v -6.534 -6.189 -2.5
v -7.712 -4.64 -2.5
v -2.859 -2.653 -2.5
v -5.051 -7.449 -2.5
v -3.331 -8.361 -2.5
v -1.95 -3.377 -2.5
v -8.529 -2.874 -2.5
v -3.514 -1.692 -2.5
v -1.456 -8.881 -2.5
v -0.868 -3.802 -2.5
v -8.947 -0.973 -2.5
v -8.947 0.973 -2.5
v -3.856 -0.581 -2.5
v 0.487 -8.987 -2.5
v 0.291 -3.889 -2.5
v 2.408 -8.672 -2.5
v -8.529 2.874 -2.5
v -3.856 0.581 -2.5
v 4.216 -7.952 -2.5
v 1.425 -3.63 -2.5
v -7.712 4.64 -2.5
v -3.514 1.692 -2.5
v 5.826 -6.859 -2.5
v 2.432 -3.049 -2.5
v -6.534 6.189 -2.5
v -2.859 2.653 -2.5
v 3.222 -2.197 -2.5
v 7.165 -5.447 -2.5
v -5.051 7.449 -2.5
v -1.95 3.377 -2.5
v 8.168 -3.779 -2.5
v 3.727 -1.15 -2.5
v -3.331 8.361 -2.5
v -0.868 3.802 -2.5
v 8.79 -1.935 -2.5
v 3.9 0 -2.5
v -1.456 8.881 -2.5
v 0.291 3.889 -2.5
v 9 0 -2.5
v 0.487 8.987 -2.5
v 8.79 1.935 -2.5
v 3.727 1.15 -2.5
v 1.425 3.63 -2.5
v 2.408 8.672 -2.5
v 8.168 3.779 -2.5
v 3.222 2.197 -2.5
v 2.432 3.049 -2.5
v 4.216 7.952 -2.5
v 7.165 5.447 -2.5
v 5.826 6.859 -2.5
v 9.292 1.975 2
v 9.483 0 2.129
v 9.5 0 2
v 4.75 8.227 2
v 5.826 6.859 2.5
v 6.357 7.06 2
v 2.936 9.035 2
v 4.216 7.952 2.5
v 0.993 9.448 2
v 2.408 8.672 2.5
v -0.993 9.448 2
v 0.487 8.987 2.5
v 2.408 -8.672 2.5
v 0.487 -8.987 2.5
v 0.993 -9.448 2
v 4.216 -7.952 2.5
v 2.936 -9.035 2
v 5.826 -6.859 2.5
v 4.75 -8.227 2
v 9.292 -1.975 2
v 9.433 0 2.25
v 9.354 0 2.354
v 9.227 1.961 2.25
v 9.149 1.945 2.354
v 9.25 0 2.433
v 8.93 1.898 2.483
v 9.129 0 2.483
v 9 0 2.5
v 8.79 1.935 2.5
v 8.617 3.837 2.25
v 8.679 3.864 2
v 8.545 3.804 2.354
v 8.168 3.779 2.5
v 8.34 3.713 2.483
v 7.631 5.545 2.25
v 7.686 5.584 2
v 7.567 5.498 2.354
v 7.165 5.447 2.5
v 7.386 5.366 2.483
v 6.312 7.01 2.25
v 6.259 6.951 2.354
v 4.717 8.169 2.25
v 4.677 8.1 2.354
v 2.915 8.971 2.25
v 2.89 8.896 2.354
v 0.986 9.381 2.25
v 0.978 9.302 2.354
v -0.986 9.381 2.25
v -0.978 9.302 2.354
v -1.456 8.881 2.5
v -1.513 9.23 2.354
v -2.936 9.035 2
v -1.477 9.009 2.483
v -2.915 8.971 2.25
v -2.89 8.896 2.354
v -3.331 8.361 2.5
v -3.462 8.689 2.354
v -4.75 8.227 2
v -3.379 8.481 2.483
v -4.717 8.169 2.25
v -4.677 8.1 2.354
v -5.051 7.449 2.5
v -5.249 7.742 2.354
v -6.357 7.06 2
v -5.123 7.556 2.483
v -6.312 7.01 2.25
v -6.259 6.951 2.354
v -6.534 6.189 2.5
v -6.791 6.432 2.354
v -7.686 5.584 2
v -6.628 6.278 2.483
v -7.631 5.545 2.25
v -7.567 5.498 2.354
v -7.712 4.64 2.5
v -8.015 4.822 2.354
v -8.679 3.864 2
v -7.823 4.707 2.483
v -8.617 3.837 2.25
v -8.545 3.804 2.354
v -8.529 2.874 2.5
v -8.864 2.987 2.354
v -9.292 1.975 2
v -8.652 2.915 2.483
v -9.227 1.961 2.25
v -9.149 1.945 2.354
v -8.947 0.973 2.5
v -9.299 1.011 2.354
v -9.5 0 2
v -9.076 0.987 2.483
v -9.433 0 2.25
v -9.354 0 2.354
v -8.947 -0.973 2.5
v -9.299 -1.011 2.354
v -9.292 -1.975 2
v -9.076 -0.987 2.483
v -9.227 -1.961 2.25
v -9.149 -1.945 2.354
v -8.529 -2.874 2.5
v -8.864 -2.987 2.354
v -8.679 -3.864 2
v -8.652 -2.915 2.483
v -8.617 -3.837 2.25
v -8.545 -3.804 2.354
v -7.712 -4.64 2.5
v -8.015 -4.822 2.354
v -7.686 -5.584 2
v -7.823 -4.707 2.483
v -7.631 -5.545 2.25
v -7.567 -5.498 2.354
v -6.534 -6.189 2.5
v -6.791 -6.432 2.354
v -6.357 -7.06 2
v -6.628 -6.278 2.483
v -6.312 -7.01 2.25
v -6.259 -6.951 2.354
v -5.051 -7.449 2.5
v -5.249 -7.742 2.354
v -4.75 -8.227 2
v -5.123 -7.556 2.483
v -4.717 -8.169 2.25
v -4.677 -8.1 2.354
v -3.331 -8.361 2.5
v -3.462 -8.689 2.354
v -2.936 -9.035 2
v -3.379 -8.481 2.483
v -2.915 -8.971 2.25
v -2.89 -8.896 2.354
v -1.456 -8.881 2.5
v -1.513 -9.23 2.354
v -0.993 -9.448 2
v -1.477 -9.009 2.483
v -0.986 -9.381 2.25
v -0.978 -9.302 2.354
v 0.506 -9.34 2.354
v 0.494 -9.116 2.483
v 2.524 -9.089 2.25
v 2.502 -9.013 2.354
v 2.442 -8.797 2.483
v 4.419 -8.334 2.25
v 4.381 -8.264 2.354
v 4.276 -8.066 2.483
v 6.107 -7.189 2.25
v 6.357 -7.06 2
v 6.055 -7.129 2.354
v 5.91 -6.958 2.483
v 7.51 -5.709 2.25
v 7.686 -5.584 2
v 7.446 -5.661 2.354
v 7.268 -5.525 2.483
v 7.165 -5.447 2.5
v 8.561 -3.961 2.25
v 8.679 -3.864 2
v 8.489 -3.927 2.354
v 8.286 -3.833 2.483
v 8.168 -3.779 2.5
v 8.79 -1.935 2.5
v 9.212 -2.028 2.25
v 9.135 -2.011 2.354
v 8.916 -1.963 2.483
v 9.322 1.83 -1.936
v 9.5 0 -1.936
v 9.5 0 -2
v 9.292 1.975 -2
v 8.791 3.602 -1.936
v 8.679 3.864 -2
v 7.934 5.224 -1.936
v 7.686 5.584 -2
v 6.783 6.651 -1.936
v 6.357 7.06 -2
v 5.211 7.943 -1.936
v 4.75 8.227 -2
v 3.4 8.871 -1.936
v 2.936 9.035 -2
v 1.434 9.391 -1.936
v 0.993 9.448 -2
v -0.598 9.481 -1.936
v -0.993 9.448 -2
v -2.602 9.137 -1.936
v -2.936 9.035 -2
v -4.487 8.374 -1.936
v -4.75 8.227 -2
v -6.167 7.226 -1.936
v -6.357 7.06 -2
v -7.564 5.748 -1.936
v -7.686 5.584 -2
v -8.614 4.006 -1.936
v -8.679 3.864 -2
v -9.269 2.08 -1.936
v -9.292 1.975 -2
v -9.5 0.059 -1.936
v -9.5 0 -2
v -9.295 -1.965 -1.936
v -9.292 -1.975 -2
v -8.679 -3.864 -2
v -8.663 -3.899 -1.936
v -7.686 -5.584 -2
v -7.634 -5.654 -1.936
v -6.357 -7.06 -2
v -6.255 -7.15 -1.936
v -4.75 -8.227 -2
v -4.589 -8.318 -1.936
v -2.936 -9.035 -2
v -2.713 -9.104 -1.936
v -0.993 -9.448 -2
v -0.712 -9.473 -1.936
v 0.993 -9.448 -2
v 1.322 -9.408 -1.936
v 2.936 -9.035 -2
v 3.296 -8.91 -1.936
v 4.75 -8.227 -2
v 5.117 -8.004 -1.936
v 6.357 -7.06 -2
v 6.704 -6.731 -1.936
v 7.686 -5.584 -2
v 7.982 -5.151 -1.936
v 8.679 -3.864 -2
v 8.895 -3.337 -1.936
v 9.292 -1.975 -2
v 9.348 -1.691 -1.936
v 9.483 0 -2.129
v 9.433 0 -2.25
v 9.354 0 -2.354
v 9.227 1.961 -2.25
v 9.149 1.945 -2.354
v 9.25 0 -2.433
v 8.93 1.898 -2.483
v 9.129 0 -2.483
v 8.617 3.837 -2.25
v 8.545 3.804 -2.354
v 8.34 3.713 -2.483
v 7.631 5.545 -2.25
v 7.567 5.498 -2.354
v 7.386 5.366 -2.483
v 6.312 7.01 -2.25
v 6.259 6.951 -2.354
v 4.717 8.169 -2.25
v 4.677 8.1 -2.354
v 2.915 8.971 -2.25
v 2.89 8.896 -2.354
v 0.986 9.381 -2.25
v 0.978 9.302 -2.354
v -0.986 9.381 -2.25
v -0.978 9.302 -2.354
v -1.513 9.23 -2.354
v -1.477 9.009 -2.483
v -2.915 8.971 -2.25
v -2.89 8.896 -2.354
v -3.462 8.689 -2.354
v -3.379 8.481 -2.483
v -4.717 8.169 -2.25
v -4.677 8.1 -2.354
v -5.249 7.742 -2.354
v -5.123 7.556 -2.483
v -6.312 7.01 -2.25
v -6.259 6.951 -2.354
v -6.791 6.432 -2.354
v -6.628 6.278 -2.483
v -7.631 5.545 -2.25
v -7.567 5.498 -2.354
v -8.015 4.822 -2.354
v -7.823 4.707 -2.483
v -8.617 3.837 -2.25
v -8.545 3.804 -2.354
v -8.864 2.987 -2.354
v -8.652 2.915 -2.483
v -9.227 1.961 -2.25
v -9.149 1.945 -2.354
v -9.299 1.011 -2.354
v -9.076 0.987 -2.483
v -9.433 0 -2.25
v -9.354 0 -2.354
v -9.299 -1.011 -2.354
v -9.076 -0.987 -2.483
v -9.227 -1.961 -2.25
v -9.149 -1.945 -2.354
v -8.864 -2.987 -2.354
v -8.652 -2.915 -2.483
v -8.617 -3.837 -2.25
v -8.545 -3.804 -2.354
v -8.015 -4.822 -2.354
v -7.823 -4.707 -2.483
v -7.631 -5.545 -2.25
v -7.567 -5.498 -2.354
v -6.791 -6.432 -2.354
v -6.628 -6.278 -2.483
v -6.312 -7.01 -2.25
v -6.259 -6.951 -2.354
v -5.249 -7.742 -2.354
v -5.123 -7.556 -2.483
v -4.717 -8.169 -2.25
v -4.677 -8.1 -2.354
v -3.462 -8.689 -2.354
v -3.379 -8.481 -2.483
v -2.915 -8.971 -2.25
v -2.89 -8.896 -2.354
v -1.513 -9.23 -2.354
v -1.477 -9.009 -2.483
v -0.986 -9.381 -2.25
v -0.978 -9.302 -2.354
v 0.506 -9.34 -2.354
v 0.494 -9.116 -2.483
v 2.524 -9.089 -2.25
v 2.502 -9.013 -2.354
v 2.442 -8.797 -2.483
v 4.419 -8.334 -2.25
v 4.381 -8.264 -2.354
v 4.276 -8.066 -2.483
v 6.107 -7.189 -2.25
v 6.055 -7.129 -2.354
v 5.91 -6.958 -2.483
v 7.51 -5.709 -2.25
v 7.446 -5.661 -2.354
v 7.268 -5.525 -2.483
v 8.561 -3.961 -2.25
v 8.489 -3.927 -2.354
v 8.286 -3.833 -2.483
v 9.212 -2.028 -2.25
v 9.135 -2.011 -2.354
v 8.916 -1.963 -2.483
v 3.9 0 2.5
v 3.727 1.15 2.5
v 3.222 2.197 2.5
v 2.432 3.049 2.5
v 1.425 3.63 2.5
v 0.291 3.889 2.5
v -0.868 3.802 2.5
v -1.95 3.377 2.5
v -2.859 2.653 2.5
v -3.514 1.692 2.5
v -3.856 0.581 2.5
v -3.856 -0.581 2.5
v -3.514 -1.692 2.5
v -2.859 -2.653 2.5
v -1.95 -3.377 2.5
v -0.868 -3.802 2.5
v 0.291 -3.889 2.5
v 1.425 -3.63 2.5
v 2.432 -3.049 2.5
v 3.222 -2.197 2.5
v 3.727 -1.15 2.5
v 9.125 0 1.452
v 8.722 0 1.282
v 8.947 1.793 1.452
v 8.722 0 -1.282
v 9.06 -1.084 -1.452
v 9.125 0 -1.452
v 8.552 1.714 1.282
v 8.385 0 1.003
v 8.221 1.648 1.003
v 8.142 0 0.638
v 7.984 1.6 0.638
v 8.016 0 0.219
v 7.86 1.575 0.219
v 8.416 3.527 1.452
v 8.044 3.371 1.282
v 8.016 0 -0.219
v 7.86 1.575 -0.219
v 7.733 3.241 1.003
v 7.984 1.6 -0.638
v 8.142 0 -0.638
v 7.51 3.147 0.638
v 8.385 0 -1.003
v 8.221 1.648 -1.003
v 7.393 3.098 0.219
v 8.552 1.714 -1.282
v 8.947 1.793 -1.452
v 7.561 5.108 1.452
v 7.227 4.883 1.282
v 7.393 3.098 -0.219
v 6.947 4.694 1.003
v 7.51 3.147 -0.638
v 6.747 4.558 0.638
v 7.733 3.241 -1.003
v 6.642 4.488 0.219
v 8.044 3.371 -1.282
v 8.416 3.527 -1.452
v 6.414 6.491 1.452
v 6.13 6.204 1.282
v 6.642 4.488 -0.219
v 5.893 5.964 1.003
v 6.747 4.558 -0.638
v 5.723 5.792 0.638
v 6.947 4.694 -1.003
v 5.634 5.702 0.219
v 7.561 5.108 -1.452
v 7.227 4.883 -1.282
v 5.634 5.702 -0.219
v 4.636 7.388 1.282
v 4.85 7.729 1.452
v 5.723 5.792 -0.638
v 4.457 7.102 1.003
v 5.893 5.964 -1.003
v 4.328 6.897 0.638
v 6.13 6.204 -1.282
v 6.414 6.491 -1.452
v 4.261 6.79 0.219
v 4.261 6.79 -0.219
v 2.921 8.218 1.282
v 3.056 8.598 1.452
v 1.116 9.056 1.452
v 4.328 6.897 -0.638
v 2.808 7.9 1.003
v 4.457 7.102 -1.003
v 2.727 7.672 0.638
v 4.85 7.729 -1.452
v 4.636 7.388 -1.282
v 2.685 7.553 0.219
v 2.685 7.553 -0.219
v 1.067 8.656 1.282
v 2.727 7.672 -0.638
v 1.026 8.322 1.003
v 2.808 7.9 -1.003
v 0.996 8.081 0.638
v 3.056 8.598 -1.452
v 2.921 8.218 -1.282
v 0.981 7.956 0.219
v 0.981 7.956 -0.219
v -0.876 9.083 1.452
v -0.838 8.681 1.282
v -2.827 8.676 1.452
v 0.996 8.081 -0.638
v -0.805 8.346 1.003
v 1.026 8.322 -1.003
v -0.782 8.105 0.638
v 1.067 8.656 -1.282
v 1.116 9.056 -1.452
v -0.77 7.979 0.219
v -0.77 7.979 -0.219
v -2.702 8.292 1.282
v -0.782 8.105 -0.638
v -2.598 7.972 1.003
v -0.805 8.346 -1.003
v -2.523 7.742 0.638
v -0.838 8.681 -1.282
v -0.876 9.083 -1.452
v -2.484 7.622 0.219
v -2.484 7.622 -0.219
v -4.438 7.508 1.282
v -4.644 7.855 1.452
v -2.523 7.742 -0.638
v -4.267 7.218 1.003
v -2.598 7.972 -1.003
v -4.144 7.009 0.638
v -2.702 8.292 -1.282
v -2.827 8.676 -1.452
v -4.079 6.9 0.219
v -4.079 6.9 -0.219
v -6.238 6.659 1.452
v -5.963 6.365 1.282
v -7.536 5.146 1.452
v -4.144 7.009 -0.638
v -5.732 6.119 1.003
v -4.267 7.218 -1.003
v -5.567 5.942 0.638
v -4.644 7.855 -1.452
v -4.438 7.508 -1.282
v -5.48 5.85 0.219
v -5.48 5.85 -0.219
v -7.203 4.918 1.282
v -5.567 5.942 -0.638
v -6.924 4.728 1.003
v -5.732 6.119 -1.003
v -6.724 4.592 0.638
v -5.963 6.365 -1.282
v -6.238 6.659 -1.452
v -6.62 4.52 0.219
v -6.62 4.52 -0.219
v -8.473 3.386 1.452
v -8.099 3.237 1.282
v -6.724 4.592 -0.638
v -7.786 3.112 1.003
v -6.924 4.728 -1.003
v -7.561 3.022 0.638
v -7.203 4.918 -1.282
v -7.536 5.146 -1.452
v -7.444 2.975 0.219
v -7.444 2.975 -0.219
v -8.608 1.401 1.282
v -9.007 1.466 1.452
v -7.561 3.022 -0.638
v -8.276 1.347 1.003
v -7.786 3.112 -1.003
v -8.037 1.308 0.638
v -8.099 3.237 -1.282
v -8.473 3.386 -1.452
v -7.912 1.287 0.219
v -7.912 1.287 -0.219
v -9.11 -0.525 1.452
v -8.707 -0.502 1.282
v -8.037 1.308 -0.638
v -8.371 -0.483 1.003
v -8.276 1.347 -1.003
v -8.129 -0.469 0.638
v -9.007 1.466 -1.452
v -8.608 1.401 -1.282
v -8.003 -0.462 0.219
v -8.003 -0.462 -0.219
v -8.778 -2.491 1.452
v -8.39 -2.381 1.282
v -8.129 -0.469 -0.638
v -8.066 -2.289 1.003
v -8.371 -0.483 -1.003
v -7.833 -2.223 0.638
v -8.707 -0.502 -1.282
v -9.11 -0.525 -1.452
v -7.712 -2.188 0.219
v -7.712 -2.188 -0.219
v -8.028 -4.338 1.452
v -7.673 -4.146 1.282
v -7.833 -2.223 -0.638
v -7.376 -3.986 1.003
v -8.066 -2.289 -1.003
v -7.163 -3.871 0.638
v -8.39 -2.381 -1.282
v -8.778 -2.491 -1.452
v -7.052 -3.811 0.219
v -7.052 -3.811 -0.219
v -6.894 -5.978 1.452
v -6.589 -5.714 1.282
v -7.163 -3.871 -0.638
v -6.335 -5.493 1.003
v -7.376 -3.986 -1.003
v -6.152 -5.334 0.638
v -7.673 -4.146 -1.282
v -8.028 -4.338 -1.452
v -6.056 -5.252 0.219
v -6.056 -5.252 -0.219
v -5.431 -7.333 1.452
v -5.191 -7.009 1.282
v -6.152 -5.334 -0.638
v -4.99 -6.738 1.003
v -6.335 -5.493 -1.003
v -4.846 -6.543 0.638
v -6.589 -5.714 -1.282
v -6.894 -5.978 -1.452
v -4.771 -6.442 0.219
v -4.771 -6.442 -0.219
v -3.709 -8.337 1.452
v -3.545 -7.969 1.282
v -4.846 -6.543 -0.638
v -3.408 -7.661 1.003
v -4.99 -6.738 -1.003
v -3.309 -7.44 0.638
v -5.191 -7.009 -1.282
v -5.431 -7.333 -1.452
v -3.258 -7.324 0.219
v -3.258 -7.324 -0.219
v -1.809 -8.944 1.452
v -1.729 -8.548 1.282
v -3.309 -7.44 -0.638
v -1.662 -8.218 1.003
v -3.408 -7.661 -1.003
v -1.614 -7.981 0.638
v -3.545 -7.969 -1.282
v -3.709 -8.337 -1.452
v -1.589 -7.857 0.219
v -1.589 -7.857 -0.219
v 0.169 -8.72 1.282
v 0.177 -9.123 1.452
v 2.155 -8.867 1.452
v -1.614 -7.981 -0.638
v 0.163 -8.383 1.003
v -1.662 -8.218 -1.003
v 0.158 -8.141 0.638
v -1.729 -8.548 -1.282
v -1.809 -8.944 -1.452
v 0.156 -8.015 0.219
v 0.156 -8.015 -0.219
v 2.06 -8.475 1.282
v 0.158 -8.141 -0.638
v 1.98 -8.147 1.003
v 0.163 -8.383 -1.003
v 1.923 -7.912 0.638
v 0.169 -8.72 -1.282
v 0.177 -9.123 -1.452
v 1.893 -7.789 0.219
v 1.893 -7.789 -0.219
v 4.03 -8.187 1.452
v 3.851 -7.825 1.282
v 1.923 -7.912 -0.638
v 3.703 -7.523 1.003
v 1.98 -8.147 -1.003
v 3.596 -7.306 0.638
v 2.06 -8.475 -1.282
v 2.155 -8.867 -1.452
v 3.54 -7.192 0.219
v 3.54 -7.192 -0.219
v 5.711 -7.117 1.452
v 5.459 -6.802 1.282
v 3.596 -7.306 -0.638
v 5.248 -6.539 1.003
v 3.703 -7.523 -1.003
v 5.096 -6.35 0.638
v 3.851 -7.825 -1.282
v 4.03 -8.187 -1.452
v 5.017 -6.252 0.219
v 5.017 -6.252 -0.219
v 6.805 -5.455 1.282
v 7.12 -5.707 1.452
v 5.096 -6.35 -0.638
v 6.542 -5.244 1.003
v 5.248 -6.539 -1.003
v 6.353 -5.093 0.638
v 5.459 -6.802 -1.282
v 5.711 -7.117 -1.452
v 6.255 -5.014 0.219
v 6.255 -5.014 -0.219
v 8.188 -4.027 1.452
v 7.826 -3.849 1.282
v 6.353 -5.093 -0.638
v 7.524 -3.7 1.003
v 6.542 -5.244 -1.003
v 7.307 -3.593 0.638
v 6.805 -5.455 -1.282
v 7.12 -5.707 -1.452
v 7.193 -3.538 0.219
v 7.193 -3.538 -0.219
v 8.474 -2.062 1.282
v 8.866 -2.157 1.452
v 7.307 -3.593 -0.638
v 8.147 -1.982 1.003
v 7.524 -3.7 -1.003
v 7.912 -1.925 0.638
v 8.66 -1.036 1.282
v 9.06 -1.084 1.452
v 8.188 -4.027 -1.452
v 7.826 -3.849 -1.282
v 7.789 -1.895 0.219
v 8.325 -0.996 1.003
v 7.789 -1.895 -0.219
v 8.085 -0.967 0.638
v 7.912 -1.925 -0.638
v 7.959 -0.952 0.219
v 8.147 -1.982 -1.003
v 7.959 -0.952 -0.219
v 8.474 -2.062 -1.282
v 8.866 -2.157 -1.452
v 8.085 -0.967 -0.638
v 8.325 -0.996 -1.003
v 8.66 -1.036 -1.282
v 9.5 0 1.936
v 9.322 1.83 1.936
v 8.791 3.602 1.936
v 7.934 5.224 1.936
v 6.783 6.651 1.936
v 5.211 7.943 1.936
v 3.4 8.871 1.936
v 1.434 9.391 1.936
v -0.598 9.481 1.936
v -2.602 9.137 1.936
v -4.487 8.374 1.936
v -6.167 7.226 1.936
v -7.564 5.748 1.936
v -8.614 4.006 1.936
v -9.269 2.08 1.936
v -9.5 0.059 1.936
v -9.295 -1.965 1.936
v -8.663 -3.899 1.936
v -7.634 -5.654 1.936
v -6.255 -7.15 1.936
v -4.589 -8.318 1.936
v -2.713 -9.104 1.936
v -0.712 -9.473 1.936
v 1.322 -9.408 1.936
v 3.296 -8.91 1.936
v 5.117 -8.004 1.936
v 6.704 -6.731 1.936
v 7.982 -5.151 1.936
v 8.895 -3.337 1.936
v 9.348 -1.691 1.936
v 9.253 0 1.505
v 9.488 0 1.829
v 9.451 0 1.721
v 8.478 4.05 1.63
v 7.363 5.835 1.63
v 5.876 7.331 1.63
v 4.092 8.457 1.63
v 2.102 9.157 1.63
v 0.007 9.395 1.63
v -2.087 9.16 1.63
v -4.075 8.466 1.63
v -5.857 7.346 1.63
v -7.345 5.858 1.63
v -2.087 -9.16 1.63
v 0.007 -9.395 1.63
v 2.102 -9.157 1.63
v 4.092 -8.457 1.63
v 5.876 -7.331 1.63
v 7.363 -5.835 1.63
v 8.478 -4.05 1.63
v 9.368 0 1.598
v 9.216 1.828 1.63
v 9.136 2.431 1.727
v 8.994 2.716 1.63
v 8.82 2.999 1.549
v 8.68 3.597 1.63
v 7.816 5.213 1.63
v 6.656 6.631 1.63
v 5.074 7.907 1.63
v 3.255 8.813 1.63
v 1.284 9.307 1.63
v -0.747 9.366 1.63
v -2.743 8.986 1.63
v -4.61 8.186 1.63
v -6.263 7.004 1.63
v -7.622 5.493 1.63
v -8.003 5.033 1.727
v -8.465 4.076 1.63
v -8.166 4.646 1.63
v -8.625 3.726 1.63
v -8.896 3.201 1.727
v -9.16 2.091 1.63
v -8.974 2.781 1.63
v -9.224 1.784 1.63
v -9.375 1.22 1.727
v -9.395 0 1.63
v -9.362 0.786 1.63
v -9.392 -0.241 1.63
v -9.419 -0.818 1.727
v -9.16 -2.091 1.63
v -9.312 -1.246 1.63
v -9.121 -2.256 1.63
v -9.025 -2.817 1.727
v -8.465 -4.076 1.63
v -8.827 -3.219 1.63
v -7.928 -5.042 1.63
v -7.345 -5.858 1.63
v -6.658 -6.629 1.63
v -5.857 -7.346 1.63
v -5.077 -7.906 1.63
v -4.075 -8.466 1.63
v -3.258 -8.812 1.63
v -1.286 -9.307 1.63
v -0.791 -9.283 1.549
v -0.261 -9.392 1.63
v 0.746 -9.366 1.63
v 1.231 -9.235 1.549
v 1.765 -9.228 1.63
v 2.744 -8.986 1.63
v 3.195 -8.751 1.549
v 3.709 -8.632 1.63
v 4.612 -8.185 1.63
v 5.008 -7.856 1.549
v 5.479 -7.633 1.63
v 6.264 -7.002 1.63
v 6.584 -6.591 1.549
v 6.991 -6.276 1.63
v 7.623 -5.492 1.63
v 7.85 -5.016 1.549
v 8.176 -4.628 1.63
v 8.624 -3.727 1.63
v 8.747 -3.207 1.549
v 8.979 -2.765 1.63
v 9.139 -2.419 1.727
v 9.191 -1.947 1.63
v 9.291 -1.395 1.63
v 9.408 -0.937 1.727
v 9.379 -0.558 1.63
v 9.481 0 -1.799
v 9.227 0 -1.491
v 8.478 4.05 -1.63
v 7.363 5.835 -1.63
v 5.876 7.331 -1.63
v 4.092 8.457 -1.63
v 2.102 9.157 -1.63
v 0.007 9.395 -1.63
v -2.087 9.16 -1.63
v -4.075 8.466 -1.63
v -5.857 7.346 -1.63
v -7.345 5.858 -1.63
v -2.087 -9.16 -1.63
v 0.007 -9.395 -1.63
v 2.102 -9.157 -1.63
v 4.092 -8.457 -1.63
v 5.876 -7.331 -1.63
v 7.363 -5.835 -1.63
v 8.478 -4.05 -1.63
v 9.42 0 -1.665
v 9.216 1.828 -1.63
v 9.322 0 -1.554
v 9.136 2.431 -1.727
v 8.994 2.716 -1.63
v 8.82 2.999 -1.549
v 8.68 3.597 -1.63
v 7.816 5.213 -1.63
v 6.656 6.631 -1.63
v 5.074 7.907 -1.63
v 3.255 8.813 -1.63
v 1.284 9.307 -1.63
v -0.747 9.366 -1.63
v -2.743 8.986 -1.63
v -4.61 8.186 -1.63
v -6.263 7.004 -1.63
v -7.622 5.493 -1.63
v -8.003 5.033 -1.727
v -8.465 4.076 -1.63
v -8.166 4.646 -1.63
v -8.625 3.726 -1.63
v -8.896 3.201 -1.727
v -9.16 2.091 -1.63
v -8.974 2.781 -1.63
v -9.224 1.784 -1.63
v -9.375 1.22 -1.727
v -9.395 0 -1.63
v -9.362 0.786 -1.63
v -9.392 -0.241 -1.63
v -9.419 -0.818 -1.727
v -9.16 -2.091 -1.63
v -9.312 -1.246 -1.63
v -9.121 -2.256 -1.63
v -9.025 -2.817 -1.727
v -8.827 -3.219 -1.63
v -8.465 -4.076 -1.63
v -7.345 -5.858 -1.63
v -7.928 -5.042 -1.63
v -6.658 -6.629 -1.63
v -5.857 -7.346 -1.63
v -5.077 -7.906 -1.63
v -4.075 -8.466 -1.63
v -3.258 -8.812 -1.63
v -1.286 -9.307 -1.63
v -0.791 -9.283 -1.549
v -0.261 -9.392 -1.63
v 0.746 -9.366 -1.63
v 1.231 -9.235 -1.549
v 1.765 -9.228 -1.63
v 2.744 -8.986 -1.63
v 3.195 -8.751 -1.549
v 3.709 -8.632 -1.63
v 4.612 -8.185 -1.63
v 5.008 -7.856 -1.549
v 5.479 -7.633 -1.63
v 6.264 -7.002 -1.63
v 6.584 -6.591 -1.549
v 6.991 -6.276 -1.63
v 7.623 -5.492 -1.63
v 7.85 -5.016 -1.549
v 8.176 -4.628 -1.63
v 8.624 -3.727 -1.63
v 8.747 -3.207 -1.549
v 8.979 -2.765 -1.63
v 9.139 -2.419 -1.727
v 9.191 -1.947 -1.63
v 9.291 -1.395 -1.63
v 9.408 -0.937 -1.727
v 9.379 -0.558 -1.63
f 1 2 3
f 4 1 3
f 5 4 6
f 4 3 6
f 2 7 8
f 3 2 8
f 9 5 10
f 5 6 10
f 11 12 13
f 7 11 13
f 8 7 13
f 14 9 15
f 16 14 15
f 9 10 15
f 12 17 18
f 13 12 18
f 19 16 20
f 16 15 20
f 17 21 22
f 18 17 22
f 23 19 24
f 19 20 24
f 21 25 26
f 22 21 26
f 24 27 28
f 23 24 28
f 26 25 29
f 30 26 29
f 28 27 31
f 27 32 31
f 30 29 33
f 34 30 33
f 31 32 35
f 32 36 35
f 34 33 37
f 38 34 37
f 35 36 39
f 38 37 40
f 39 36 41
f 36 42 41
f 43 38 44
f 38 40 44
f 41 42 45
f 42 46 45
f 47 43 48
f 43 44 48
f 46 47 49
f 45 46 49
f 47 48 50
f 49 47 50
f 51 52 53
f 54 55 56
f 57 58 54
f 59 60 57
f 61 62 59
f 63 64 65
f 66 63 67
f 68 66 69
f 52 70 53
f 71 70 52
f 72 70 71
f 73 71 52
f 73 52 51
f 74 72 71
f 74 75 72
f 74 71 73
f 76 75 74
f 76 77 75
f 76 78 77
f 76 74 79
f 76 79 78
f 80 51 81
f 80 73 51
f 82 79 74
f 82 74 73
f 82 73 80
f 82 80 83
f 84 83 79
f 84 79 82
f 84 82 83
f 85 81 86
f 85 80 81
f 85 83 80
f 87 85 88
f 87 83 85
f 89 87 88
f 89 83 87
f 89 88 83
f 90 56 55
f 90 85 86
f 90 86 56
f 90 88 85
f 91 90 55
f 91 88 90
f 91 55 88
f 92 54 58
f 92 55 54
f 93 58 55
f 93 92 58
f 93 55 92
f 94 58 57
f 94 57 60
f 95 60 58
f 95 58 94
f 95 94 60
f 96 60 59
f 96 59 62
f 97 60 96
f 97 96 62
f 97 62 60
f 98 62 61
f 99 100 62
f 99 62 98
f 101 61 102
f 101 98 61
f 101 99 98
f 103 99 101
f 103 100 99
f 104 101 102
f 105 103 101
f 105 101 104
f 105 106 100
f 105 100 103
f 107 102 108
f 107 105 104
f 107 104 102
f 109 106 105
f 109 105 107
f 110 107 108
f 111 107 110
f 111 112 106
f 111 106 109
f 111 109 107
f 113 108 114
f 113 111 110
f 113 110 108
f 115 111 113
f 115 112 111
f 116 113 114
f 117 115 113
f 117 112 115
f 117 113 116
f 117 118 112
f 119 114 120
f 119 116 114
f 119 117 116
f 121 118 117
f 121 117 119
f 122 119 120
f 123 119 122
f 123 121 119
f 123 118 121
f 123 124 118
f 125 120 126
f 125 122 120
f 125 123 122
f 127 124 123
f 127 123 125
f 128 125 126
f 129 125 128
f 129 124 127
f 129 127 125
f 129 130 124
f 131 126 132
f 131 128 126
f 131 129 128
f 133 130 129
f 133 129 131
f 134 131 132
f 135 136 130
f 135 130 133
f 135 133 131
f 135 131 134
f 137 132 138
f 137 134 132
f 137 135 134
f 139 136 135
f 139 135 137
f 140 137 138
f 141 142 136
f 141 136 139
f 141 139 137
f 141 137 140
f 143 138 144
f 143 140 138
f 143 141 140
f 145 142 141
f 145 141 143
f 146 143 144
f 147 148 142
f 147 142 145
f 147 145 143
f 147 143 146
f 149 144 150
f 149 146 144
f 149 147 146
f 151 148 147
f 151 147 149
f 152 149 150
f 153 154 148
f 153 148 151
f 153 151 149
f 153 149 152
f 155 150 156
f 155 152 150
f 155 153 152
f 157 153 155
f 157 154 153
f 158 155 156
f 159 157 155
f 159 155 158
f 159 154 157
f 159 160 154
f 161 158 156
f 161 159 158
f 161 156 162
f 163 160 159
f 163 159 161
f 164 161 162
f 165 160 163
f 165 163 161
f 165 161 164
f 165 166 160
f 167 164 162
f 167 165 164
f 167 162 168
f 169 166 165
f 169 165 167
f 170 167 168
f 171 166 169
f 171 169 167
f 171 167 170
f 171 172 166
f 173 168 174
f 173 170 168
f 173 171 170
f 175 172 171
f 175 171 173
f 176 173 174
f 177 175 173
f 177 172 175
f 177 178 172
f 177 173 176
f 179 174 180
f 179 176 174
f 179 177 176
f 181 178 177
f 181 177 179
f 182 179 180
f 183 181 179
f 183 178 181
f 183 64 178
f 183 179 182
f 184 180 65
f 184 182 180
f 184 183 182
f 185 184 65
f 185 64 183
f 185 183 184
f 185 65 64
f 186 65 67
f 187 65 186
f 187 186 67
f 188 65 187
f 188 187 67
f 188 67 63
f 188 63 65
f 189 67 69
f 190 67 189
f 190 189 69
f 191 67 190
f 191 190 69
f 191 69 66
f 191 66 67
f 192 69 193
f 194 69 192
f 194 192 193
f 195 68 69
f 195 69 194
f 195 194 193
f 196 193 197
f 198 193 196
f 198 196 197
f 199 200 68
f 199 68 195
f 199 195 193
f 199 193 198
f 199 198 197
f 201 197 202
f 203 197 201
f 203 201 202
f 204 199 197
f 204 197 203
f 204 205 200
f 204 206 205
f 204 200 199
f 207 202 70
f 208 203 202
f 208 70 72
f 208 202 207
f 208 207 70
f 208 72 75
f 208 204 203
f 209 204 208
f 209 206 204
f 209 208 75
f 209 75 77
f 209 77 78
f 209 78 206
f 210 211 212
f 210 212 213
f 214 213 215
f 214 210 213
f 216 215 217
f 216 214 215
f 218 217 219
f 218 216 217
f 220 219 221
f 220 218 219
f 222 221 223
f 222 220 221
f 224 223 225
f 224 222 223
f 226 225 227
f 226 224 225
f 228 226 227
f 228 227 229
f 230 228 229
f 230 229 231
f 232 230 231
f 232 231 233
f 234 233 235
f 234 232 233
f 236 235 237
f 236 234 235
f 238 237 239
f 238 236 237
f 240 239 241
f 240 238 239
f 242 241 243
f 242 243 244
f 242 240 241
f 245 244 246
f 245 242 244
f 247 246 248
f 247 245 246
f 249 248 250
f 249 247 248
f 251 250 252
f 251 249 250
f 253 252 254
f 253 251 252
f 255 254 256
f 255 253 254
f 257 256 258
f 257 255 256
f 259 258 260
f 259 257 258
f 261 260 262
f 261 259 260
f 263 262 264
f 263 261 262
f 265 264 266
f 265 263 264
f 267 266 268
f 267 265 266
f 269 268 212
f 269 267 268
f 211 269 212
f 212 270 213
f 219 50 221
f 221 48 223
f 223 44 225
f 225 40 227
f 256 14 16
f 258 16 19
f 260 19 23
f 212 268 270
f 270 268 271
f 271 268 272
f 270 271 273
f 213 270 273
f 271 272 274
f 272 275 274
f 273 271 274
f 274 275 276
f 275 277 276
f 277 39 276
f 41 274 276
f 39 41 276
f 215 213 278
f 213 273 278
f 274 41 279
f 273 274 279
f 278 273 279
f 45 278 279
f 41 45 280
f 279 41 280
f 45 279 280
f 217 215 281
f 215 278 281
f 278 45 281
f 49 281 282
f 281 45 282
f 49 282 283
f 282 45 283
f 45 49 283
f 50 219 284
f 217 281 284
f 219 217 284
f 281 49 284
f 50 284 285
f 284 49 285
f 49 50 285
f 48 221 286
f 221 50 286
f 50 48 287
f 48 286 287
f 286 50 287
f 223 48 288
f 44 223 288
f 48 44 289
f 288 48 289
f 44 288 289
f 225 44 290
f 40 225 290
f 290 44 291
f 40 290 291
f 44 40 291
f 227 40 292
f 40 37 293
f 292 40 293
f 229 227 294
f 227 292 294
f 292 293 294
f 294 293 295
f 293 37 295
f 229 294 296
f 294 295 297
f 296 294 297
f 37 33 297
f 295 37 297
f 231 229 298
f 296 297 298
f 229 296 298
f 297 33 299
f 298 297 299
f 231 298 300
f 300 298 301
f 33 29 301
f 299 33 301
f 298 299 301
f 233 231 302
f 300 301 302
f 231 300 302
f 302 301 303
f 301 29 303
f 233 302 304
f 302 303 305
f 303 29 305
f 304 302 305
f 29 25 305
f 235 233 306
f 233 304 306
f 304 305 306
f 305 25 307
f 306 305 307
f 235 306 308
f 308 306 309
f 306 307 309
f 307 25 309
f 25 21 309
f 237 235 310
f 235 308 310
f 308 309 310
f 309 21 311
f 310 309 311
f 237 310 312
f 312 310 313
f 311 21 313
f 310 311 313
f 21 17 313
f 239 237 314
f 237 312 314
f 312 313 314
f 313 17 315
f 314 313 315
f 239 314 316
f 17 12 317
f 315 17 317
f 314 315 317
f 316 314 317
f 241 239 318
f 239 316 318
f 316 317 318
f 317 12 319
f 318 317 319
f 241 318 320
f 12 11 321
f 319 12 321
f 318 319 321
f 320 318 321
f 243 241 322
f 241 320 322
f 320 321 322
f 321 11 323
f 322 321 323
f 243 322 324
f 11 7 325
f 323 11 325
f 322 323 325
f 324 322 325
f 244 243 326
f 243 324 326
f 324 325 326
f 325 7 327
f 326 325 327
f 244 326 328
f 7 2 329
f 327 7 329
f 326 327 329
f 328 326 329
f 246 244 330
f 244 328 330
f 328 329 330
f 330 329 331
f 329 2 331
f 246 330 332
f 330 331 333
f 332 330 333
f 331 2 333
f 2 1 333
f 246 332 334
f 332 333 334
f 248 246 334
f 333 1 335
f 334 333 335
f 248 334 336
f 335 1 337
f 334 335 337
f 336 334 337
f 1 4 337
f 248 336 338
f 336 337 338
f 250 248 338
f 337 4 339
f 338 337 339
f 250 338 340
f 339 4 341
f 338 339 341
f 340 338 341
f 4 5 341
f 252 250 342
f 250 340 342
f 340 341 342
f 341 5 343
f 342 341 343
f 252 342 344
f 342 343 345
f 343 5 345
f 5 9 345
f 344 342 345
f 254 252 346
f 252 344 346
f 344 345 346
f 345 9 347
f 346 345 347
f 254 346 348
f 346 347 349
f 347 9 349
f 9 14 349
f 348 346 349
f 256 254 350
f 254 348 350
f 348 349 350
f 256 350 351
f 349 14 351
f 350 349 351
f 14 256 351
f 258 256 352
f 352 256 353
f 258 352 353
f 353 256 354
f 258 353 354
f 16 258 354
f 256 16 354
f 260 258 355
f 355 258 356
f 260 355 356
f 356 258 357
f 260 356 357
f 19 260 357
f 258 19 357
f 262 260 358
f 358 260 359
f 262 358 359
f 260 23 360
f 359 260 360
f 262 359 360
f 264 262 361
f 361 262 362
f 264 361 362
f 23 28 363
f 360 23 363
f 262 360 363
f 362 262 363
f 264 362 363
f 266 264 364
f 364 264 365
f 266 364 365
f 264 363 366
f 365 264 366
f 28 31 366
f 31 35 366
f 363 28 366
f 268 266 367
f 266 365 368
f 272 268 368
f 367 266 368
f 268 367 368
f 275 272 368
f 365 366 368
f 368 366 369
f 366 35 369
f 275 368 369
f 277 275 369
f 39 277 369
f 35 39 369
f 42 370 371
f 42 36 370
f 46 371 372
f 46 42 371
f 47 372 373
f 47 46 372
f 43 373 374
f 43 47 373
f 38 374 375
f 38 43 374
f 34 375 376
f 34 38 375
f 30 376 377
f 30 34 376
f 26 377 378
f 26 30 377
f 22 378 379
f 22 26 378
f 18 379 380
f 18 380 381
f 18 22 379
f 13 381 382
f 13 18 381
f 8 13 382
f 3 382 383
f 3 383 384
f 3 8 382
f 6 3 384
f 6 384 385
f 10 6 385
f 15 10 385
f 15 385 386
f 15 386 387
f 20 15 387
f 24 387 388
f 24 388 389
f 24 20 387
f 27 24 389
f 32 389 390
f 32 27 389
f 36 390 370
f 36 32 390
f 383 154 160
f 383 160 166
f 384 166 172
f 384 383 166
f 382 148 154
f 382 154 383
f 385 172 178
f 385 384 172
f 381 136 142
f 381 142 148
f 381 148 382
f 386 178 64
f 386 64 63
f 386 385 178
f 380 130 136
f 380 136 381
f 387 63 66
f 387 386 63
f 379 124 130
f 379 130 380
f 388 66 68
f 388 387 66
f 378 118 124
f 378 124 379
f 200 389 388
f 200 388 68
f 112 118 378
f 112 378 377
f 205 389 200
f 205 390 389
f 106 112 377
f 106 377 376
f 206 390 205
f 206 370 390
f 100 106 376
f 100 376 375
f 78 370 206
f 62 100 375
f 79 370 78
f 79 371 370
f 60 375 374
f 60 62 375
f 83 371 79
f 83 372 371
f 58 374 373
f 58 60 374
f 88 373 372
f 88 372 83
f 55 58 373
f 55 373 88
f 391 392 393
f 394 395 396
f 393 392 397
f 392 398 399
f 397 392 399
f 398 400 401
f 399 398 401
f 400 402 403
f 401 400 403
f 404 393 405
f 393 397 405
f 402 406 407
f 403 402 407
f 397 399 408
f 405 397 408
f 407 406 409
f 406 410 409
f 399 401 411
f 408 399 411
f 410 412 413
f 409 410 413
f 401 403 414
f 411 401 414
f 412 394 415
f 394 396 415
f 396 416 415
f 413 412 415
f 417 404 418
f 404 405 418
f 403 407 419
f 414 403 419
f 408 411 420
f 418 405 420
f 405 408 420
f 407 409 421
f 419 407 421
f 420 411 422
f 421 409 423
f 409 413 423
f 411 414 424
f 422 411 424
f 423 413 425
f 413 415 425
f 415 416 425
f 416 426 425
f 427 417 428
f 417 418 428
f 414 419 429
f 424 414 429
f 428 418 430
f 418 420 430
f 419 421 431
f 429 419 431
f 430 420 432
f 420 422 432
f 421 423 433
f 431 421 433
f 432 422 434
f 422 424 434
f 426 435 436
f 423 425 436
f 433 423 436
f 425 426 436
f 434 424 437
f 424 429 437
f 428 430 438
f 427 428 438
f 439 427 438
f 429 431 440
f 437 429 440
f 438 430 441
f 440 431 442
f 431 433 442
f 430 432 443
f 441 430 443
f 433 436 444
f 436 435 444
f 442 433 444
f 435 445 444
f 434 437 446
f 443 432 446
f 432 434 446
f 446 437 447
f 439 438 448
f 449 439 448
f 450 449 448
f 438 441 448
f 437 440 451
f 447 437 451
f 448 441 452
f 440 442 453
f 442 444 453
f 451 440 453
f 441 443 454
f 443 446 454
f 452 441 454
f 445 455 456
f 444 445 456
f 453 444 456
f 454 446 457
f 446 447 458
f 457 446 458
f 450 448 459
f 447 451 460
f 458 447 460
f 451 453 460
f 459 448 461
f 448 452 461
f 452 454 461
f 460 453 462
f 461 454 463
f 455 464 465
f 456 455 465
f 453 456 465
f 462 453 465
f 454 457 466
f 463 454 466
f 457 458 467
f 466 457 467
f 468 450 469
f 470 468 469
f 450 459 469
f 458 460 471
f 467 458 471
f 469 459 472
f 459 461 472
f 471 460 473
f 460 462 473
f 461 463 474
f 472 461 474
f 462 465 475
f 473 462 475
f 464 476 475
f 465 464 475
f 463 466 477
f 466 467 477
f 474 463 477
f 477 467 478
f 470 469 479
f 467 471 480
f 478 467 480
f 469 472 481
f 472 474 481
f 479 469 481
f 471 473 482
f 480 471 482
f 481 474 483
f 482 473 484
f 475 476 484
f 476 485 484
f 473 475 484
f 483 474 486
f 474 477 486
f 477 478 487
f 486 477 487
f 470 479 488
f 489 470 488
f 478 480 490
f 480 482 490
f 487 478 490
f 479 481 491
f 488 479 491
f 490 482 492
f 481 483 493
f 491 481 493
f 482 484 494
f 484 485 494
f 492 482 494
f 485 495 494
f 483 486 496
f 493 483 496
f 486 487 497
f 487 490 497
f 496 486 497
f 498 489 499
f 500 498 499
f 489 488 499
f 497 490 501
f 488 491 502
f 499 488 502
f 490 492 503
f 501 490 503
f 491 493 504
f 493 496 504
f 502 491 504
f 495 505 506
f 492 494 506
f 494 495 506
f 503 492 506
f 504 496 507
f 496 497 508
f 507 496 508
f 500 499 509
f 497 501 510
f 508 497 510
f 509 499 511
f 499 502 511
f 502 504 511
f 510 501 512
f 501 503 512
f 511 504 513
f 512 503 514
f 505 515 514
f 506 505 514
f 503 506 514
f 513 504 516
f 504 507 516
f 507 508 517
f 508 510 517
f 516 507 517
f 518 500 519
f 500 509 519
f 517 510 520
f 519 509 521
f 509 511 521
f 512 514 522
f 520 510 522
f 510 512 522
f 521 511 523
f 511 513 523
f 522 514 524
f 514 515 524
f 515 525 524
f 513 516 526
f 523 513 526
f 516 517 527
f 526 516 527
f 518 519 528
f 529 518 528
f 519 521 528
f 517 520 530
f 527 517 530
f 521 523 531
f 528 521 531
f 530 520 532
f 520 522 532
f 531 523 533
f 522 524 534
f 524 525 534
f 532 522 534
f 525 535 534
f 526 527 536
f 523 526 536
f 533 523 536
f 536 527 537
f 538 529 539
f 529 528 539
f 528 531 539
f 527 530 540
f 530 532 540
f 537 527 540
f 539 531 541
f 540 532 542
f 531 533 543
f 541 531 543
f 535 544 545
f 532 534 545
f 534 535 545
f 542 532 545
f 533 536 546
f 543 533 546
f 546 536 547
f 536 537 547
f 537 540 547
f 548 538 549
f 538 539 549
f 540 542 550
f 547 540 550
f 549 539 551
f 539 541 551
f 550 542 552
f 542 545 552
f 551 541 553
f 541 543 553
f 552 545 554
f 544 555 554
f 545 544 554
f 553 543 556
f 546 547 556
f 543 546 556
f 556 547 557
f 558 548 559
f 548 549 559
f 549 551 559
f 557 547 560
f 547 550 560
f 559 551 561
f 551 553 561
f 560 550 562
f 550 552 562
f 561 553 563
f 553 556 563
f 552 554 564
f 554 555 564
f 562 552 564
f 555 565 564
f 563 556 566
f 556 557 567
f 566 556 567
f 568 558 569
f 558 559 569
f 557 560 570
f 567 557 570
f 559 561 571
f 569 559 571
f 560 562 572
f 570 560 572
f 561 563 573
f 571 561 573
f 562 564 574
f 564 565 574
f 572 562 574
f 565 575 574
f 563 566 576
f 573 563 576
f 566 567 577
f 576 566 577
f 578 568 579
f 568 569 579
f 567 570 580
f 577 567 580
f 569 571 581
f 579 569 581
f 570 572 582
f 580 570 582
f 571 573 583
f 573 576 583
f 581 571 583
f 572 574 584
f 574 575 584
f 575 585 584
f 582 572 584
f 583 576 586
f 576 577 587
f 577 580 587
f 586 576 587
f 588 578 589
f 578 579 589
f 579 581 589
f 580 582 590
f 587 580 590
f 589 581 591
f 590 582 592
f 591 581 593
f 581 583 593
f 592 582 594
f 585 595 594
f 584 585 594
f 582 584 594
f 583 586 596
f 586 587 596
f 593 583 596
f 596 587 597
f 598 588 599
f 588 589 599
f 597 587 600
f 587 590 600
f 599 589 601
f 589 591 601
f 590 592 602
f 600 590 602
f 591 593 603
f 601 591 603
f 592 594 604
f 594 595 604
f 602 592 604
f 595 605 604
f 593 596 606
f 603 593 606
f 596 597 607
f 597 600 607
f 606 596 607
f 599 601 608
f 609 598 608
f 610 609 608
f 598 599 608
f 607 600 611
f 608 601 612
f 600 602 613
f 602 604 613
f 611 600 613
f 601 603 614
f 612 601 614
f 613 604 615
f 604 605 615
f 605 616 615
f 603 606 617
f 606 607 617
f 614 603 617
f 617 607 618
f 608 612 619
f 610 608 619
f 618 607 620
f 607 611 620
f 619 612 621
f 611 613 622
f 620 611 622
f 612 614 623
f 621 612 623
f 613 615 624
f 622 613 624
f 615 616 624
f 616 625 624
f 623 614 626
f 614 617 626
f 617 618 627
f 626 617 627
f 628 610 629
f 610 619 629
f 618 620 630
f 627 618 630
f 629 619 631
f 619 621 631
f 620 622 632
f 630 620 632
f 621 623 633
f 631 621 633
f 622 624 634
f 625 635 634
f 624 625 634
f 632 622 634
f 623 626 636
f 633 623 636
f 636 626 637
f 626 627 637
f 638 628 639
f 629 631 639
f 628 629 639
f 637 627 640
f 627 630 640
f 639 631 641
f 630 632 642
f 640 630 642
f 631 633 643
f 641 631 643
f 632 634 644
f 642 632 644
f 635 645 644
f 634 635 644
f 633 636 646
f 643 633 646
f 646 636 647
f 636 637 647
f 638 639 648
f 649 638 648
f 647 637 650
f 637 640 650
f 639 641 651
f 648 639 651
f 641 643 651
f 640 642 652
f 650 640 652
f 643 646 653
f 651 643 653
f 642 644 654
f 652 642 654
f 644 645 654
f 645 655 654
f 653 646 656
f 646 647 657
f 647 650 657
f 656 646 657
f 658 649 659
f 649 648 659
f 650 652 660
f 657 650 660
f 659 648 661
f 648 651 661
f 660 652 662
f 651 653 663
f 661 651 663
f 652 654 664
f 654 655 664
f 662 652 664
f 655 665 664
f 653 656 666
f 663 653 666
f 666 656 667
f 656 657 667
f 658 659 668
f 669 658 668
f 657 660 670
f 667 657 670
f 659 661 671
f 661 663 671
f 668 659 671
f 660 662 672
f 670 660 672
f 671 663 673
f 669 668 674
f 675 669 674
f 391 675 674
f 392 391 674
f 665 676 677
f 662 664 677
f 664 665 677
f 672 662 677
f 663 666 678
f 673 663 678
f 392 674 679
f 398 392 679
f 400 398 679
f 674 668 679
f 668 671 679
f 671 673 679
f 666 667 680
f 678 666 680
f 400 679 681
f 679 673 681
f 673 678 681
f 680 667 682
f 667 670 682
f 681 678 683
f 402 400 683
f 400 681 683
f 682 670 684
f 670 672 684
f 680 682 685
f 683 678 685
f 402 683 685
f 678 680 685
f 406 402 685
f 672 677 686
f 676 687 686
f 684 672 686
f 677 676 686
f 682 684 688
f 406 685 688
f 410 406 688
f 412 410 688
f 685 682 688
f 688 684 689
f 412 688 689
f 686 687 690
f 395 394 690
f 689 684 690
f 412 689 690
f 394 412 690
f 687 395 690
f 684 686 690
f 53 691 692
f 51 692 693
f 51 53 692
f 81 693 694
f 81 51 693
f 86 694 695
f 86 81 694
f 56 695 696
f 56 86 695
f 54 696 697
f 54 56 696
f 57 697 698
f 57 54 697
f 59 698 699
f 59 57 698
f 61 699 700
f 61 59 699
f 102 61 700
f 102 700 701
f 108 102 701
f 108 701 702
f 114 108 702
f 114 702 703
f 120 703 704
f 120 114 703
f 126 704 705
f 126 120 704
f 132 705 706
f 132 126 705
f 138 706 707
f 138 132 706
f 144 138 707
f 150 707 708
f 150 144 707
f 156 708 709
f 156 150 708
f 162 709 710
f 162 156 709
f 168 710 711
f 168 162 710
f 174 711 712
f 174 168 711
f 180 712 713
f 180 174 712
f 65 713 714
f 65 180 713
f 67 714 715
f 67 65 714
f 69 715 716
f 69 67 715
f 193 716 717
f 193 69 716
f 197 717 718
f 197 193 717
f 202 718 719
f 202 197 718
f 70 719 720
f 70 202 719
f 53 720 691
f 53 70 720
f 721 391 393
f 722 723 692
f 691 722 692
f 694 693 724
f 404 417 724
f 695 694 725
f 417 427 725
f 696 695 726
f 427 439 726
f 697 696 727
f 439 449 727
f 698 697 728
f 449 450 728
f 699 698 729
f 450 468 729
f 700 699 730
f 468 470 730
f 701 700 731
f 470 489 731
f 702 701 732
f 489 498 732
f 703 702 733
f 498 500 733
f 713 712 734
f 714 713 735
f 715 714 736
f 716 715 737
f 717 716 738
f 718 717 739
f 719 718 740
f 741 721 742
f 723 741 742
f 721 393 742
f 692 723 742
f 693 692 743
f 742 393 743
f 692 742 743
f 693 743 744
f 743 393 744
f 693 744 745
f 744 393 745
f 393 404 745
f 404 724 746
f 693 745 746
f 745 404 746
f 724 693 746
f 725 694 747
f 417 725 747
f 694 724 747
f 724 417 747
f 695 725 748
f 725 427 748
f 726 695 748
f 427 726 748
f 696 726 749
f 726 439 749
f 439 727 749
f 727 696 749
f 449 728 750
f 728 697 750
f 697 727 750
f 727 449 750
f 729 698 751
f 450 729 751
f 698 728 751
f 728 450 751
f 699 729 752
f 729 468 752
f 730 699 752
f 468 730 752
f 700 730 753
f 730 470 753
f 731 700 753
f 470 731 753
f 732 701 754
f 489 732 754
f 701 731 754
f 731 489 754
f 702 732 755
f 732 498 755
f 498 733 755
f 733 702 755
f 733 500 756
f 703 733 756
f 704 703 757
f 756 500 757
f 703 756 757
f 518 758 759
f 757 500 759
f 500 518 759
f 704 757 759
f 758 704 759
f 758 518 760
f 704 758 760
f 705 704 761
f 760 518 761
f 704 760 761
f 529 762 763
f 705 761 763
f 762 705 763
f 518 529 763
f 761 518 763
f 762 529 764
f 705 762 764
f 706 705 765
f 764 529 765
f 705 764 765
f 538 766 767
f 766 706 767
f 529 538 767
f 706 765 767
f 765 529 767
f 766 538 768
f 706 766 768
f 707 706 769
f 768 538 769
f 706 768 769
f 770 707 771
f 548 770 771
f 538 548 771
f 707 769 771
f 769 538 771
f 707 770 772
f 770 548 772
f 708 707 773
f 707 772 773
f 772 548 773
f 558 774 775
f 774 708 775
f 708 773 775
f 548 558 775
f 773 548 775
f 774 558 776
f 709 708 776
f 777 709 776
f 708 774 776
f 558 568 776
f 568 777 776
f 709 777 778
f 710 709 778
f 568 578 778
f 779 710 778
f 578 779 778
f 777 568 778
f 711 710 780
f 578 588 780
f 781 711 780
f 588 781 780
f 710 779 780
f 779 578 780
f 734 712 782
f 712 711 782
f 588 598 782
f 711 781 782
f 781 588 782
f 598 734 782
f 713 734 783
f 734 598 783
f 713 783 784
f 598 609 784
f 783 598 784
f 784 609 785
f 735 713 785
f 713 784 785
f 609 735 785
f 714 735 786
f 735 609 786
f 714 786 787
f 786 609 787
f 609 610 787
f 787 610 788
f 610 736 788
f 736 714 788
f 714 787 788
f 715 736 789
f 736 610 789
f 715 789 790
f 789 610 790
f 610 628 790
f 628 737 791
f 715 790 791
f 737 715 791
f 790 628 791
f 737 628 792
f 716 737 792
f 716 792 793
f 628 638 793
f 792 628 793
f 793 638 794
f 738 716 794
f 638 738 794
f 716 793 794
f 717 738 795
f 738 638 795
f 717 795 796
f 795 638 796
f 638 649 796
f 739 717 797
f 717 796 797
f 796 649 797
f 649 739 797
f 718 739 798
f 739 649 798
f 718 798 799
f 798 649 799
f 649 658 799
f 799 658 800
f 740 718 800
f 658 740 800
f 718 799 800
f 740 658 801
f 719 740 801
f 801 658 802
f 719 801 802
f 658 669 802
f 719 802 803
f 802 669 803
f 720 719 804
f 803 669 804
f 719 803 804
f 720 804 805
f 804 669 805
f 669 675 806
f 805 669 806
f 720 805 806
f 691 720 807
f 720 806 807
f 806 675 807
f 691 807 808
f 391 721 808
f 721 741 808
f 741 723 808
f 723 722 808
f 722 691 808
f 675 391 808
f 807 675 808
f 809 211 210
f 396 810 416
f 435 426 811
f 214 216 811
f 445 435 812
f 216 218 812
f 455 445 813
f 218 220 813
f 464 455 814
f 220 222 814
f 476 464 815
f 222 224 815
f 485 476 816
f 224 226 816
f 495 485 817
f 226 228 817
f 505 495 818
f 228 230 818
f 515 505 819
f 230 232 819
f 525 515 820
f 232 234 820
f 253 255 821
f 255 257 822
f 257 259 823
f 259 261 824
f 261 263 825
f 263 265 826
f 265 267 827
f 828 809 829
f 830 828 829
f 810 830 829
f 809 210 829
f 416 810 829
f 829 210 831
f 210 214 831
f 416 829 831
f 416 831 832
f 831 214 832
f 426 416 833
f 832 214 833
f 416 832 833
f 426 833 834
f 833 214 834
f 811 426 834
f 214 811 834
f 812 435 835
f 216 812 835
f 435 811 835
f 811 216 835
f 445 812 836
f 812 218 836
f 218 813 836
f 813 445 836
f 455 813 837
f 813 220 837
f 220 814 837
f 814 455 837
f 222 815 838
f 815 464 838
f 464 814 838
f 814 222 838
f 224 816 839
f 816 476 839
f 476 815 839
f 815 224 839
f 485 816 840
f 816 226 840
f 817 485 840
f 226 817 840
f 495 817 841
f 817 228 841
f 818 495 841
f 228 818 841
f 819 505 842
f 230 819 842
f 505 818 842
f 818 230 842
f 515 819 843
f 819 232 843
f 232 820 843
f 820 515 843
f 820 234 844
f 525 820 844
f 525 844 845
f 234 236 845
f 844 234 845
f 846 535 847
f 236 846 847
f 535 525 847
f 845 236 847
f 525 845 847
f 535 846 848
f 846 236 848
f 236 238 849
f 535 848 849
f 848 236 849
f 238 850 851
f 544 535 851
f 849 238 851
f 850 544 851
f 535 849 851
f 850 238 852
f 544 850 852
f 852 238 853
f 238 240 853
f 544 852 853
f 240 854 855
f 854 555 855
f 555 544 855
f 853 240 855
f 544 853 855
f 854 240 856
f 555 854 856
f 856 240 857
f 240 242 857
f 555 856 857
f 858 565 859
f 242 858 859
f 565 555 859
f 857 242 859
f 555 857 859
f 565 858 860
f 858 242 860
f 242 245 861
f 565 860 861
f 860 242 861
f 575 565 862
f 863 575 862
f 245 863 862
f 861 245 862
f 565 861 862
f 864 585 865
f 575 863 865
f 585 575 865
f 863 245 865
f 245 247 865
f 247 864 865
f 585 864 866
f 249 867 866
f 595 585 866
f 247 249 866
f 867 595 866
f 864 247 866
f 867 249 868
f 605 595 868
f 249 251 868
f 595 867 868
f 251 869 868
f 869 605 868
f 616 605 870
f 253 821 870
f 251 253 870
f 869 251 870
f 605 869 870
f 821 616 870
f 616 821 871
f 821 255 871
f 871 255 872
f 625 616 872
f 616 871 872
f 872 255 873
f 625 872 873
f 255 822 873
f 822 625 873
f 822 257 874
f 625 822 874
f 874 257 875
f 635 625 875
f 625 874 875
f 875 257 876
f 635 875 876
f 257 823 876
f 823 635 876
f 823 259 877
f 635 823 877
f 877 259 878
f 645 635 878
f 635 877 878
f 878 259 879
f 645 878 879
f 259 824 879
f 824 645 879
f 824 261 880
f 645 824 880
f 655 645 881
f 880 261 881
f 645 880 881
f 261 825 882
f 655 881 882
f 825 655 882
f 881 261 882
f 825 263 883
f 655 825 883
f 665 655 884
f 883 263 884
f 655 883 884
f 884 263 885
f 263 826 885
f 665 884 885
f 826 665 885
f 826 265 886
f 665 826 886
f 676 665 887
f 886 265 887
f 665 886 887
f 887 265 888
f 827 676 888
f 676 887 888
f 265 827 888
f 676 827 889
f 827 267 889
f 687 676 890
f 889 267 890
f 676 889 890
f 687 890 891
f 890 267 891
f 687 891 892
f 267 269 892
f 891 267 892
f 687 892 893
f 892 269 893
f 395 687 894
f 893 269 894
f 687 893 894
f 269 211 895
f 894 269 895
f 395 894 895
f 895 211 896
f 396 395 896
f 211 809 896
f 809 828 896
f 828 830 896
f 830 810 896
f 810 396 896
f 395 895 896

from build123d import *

# Parameters (mm, degrees)
SKETCH_1_R      = 9.5
SKETCH_1_R_2    = 3.9
EXTRUDE_1_DEPTH = 2.5
SKETCH_3_R      = 1.5
FILLET_1_R      = 0.5
FILLET_2_R      = 0.5


with BuildPart() as part:
    # Эскиз1 → Бобышка-Вытянуть1 (new, symmetric)
    with BuildSketch(Plane.XY):
        Circle(SKETCH_1_R)
        Circle(SKETCH_1_R_2, mode=Mode.SUBTRACT)
    extrude(amount=EXTRUDE_1_DEPTH, both=True)

    # Вырез-По траектории1: sweep along a path in Эскиз4
    with BuildLine(Plane.XY) as sweep_1_path:
        CenterArc((0, 0), 9.5, 0, 360)
    # Эскиз3 → Вырез-По траектории1 (sweep, cut)
    with BuildSketch(Plane(origin=(0, 0, 0), x_dir=(1, 0, 0), z_dir=(0, 1, 0))):
        with Locations((9.5, 0)):
            Circle(SKETCH_3_R)
    sweep(path=sweep_1_path.line, mode=Mode.SUBTRACT)

    # Скругление1
    fillet_1_edges = [part.edges().sort_by_distance(p)[0] for p in [
        (-9.5, 0, -2.5),
        (-9.5, 0, 2.5),
    ]]
    fillet(fillet_1_edges, radius=FILLET_1_R)

    # Скругление2
    fillet_2_edges = [part.edges().sort_by_distance(p)[0] for p in [
        (-9.5, 0, 1.5),
        (-9.5, 0, -1.5),
    ]]
    fillet(fillet_2_edges, radius=FILLET_2_R)


solid = part.part
